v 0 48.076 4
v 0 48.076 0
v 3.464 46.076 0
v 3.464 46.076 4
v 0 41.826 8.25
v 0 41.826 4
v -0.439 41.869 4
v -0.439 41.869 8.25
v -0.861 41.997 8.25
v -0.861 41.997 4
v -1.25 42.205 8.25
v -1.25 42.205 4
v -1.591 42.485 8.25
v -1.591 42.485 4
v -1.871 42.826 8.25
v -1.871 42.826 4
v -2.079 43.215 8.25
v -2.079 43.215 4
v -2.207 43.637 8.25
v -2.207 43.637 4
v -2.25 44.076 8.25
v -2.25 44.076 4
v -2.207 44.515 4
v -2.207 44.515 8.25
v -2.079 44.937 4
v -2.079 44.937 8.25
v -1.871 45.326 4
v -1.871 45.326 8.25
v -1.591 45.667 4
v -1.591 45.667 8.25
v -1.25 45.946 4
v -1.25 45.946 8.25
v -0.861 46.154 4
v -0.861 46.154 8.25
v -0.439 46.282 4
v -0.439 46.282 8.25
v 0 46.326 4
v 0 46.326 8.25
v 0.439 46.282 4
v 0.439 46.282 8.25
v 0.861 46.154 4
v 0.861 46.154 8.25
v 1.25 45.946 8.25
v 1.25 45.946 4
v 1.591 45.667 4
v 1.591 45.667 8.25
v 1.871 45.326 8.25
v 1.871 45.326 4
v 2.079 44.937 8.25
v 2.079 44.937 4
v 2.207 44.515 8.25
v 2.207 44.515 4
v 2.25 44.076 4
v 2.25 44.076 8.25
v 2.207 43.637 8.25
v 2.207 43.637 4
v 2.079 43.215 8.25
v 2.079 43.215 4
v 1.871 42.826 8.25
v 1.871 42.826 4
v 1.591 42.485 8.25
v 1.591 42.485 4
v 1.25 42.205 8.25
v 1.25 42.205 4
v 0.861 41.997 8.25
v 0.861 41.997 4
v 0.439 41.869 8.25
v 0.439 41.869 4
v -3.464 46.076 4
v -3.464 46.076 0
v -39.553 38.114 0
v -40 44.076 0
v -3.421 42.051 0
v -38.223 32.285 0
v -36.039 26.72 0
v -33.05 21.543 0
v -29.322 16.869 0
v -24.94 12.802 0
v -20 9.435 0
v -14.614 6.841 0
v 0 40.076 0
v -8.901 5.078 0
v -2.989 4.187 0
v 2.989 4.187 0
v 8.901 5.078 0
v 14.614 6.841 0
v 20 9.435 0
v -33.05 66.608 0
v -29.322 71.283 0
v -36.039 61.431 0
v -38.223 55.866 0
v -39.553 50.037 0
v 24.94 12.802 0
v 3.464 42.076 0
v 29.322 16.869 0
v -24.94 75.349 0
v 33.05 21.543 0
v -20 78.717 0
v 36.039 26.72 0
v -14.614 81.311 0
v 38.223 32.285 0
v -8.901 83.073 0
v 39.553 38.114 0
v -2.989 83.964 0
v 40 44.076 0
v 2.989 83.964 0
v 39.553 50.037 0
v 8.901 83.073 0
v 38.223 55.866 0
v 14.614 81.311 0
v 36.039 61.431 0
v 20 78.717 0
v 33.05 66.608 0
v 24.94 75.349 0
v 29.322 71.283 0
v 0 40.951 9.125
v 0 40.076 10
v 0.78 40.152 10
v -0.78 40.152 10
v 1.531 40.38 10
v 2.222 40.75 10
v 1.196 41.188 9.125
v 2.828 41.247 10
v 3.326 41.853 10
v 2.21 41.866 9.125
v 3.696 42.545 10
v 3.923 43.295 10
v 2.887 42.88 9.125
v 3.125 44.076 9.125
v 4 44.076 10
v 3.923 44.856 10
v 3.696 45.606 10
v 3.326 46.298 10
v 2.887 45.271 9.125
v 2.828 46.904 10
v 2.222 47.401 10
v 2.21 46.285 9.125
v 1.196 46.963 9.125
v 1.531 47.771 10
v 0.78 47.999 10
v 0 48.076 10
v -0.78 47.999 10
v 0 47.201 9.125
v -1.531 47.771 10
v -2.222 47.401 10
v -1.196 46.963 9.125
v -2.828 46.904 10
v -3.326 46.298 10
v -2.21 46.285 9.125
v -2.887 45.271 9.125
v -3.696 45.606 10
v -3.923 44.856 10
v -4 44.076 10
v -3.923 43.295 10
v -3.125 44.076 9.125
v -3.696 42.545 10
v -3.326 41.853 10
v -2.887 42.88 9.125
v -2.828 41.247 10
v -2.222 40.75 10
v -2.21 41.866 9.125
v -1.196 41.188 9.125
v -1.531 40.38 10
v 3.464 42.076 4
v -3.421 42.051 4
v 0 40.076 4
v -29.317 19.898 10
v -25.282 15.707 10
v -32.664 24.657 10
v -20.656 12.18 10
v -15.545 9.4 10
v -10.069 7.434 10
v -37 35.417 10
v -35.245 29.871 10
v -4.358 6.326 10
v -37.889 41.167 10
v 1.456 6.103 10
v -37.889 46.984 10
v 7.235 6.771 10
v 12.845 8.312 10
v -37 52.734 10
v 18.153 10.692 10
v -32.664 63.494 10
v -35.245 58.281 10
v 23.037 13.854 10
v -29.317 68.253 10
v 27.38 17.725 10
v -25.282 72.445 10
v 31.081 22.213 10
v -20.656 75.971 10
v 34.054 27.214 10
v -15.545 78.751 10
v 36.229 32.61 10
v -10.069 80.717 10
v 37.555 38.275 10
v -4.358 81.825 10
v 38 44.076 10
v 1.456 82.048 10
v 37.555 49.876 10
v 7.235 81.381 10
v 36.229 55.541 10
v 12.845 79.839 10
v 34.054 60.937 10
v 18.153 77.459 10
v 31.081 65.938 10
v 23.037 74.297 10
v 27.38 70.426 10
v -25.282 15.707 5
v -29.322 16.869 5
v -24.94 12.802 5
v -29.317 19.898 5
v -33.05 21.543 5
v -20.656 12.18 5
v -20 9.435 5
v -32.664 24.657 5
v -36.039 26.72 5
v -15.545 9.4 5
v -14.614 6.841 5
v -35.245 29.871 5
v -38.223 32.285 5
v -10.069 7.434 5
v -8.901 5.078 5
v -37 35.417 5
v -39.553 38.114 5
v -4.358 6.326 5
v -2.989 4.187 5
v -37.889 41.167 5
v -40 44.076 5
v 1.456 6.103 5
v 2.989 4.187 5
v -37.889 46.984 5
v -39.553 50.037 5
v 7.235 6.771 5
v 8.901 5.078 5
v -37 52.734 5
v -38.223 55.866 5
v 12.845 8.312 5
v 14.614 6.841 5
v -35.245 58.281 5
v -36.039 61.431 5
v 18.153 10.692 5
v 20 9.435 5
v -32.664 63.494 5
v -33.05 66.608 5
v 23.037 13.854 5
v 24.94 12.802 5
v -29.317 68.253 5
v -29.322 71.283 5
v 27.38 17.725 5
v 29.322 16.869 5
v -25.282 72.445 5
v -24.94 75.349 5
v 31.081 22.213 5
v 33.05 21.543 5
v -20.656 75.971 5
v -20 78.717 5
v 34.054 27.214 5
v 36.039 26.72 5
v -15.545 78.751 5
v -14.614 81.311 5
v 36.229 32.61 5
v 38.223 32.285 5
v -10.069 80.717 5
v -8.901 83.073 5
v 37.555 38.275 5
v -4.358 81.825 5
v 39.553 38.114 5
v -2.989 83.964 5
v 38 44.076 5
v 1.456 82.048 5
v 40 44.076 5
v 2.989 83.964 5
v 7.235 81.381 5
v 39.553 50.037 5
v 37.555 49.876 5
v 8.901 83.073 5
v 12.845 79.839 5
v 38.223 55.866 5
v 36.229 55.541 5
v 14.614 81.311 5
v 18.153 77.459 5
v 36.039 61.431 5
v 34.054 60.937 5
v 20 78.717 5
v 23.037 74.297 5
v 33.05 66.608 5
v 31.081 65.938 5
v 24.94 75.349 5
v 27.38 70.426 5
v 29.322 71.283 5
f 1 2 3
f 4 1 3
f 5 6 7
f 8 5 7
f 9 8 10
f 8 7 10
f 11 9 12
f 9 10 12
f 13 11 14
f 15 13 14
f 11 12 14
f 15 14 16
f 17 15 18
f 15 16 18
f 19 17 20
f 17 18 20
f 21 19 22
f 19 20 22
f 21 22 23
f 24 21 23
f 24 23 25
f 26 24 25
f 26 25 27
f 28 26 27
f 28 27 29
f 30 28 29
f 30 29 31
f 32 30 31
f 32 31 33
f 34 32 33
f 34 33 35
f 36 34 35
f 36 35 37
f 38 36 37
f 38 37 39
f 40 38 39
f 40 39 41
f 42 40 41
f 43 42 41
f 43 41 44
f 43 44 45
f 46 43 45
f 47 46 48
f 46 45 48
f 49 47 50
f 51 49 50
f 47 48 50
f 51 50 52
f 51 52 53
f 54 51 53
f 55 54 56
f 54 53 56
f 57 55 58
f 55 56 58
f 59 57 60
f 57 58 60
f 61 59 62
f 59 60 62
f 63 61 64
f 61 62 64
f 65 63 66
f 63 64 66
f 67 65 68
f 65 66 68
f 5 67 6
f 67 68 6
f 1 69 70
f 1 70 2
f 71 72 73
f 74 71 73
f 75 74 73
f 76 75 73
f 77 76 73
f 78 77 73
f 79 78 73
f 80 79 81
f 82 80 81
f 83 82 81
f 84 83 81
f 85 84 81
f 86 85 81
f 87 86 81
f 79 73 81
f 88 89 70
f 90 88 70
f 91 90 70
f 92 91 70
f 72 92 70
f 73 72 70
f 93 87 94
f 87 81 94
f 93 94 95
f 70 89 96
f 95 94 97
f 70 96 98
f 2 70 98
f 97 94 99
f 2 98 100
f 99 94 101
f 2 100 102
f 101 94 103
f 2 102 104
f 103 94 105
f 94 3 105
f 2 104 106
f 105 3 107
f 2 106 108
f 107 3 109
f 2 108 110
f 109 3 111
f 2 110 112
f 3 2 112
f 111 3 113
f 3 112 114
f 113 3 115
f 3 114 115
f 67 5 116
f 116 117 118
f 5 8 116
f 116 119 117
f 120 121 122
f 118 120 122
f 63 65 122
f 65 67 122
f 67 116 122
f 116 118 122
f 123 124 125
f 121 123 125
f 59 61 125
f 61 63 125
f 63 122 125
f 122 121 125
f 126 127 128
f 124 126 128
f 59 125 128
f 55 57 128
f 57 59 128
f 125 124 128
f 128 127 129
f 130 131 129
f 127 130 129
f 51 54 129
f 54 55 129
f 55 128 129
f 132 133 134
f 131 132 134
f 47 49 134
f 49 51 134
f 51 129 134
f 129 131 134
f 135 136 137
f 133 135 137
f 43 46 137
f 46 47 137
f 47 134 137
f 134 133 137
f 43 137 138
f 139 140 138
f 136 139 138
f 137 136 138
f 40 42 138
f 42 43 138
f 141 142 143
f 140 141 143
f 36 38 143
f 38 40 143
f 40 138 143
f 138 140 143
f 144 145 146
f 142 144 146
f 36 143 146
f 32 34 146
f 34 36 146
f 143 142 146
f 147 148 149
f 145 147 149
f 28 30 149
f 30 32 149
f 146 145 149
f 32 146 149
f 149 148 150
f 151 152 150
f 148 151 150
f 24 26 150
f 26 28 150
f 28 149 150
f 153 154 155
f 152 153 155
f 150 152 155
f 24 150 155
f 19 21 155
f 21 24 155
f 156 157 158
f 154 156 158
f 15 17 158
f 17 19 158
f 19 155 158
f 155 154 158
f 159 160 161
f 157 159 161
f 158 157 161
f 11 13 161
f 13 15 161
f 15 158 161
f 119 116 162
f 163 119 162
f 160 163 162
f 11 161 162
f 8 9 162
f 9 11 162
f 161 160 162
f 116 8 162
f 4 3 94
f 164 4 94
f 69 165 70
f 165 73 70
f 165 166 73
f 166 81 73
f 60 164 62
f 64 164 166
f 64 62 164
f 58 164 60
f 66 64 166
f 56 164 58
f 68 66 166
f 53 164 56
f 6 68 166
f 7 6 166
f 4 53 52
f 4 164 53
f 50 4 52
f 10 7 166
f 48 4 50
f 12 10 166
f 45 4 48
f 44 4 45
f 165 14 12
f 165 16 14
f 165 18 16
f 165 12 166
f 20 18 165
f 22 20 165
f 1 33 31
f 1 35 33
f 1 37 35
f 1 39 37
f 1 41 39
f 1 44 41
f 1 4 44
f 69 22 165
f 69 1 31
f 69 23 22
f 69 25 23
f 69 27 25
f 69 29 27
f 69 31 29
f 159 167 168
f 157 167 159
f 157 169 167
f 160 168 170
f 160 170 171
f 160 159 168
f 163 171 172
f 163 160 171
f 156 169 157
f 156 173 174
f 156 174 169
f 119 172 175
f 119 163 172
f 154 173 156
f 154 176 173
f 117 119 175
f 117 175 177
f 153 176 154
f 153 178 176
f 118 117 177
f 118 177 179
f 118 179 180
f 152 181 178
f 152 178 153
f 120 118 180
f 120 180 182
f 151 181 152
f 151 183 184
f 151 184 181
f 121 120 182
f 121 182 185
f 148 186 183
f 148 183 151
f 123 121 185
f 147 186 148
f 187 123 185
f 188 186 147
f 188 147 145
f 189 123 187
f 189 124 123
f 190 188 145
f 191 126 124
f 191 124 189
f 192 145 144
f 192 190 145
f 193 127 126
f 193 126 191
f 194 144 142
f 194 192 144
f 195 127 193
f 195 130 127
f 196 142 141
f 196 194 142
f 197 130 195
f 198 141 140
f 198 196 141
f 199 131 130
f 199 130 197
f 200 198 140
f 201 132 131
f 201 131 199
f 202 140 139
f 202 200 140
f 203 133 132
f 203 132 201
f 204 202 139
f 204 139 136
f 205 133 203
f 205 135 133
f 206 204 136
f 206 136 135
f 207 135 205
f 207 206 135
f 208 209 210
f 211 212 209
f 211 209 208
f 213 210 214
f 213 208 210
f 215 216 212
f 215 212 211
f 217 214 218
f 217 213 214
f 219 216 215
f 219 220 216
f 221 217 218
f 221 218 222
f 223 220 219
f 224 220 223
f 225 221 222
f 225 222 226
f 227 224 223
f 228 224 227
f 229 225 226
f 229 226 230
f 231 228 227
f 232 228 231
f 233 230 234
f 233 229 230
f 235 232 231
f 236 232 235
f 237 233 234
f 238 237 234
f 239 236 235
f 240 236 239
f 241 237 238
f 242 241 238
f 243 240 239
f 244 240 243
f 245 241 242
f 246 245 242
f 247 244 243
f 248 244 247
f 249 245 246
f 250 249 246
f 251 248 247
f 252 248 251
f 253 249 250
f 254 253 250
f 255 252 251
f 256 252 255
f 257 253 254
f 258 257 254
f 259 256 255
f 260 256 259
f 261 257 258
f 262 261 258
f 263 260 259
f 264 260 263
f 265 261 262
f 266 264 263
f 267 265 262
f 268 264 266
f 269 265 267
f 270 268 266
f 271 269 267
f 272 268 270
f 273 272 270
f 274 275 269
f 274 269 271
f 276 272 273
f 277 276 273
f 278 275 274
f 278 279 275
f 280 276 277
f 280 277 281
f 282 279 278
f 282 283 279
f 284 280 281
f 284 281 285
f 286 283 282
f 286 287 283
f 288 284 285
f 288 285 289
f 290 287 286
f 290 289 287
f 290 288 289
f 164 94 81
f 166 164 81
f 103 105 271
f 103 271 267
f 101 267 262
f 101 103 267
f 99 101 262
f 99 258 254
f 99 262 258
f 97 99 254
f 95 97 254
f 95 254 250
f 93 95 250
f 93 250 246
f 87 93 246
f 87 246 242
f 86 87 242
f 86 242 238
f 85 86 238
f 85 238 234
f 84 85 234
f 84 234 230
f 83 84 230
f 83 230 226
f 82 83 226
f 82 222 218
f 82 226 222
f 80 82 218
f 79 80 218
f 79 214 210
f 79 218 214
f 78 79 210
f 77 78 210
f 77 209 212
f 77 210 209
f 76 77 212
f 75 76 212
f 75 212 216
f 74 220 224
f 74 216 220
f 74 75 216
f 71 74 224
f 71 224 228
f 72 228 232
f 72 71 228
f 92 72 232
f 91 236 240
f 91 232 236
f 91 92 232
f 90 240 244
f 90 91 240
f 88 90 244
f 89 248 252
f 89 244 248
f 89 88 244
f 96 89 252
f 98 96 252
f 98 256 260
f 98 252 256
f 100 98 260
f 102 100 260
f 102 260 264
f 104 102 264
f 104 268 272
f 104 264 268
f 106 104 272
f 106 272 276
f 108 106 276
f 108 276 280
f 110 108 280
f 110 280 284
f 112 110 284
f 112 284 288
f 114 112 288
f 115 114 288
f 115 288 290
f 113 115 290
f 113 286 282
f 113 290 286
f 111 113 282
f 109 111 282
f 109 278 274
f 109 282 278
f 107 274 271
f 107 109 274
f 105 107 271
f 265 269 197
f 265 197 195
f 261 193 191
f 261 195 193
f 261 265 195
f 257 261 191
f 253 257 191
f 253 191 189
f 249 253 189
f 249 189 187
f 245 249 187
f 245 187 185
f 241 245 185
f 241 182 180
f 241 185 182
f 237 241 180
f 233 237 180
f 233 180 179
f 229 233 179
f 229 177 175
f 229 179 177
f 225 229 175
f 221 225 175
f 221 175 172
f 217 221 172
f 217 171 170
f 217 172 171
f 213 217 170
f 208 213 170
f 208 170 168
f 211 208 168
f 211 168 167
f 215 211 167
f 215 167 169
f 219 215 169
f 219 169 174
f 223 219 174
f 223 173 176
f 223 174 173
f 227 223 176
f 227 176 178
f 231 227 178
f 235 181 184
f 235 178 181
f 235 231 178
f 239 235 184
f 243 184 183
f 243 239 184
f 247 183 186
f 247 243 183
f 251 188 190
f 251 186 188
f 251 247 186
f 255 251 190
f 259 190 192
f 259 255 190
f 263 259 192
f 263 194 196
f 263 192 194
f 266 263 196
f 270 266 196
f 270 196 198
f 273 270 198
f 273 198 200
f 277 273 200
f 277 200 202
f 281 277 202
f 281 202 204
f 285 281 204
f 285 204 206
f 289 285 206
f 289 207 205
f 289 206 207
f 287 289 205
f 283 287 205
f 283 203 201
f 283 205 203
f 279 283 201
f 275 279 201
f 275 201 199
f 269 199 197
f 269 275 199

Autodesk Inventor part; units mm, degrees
ref_plane "YZ Plane" through (0, 0, 0) normal (1, 0, 0) x (0, 1, 0)
ref_plane "XZ Plane" through (0, 0, 0) normal (0, 1, 0) x (-1, 0, 0)
ref_plane "XY Plane" through (0, 0, 0) normal (0, 0, 1) x (1, 0, 0)
sketch "Эскиз1" plane through (0, 0, 0) normal (0, 0, 1) x (1, 0, 0)
  circle A0 centre (0, 44.0756) radius 40
  point P0 (0, 0)
  dimension "d0" = 80
extrude "Выдавливание1" add sketch "Эскиз1" along normal blind 5
sketch "Эскиз2" plane through (0, 44.0756, 0) normal (0, 0, -1) x (-1, 0, 0)
  line L0 (0, 4) -> (-3.4641, 2)
  line L1 (-3.4641, 2) -> (-3.4641, -2)
  line L2 (-3.4641, -2) -> (0, -4)
  line L3 (0, -4) -> (3.421, -2.0249)
  line L4 (3.421, -2.0249) -> (3.4641, 2)
  line L5 (3.4641, 2) -> (0, 4)
  point P0 (0, -44.0756)
  point P1 (0, 0)
extrude "Выдавливание2" cut sketch "Эскиз2" against normal blind 4
sketch "Эскиз3" plane through (0, 44.0756, 5) normal (0, 0, 1) x (1, 0, 0)
  circle A0 centre (0, 0) radius 40 projected
  circle A1 centre (0, 0) radius 38
  point P0 (0, -44.0756)
  dimension "d5" = 2
extrude "Выдавливание3" add sketch "Эскиз3" along normal blind 5 contours A1
sketch "Эскиз5" plane through (0, 44.0756, 10) normal (0, 0, 1) x (1, 0, 0)
  circle A0 centre (0, 0) radius 38 projected
  point P0 (0, -44.0756)
hole "Отверстие1" at (0, 44.0756, 10) direction (0, 0, -1) diameter 4.5 end through all countersink diameter 8 countersink angle 90
properties part number "Cap-01"
